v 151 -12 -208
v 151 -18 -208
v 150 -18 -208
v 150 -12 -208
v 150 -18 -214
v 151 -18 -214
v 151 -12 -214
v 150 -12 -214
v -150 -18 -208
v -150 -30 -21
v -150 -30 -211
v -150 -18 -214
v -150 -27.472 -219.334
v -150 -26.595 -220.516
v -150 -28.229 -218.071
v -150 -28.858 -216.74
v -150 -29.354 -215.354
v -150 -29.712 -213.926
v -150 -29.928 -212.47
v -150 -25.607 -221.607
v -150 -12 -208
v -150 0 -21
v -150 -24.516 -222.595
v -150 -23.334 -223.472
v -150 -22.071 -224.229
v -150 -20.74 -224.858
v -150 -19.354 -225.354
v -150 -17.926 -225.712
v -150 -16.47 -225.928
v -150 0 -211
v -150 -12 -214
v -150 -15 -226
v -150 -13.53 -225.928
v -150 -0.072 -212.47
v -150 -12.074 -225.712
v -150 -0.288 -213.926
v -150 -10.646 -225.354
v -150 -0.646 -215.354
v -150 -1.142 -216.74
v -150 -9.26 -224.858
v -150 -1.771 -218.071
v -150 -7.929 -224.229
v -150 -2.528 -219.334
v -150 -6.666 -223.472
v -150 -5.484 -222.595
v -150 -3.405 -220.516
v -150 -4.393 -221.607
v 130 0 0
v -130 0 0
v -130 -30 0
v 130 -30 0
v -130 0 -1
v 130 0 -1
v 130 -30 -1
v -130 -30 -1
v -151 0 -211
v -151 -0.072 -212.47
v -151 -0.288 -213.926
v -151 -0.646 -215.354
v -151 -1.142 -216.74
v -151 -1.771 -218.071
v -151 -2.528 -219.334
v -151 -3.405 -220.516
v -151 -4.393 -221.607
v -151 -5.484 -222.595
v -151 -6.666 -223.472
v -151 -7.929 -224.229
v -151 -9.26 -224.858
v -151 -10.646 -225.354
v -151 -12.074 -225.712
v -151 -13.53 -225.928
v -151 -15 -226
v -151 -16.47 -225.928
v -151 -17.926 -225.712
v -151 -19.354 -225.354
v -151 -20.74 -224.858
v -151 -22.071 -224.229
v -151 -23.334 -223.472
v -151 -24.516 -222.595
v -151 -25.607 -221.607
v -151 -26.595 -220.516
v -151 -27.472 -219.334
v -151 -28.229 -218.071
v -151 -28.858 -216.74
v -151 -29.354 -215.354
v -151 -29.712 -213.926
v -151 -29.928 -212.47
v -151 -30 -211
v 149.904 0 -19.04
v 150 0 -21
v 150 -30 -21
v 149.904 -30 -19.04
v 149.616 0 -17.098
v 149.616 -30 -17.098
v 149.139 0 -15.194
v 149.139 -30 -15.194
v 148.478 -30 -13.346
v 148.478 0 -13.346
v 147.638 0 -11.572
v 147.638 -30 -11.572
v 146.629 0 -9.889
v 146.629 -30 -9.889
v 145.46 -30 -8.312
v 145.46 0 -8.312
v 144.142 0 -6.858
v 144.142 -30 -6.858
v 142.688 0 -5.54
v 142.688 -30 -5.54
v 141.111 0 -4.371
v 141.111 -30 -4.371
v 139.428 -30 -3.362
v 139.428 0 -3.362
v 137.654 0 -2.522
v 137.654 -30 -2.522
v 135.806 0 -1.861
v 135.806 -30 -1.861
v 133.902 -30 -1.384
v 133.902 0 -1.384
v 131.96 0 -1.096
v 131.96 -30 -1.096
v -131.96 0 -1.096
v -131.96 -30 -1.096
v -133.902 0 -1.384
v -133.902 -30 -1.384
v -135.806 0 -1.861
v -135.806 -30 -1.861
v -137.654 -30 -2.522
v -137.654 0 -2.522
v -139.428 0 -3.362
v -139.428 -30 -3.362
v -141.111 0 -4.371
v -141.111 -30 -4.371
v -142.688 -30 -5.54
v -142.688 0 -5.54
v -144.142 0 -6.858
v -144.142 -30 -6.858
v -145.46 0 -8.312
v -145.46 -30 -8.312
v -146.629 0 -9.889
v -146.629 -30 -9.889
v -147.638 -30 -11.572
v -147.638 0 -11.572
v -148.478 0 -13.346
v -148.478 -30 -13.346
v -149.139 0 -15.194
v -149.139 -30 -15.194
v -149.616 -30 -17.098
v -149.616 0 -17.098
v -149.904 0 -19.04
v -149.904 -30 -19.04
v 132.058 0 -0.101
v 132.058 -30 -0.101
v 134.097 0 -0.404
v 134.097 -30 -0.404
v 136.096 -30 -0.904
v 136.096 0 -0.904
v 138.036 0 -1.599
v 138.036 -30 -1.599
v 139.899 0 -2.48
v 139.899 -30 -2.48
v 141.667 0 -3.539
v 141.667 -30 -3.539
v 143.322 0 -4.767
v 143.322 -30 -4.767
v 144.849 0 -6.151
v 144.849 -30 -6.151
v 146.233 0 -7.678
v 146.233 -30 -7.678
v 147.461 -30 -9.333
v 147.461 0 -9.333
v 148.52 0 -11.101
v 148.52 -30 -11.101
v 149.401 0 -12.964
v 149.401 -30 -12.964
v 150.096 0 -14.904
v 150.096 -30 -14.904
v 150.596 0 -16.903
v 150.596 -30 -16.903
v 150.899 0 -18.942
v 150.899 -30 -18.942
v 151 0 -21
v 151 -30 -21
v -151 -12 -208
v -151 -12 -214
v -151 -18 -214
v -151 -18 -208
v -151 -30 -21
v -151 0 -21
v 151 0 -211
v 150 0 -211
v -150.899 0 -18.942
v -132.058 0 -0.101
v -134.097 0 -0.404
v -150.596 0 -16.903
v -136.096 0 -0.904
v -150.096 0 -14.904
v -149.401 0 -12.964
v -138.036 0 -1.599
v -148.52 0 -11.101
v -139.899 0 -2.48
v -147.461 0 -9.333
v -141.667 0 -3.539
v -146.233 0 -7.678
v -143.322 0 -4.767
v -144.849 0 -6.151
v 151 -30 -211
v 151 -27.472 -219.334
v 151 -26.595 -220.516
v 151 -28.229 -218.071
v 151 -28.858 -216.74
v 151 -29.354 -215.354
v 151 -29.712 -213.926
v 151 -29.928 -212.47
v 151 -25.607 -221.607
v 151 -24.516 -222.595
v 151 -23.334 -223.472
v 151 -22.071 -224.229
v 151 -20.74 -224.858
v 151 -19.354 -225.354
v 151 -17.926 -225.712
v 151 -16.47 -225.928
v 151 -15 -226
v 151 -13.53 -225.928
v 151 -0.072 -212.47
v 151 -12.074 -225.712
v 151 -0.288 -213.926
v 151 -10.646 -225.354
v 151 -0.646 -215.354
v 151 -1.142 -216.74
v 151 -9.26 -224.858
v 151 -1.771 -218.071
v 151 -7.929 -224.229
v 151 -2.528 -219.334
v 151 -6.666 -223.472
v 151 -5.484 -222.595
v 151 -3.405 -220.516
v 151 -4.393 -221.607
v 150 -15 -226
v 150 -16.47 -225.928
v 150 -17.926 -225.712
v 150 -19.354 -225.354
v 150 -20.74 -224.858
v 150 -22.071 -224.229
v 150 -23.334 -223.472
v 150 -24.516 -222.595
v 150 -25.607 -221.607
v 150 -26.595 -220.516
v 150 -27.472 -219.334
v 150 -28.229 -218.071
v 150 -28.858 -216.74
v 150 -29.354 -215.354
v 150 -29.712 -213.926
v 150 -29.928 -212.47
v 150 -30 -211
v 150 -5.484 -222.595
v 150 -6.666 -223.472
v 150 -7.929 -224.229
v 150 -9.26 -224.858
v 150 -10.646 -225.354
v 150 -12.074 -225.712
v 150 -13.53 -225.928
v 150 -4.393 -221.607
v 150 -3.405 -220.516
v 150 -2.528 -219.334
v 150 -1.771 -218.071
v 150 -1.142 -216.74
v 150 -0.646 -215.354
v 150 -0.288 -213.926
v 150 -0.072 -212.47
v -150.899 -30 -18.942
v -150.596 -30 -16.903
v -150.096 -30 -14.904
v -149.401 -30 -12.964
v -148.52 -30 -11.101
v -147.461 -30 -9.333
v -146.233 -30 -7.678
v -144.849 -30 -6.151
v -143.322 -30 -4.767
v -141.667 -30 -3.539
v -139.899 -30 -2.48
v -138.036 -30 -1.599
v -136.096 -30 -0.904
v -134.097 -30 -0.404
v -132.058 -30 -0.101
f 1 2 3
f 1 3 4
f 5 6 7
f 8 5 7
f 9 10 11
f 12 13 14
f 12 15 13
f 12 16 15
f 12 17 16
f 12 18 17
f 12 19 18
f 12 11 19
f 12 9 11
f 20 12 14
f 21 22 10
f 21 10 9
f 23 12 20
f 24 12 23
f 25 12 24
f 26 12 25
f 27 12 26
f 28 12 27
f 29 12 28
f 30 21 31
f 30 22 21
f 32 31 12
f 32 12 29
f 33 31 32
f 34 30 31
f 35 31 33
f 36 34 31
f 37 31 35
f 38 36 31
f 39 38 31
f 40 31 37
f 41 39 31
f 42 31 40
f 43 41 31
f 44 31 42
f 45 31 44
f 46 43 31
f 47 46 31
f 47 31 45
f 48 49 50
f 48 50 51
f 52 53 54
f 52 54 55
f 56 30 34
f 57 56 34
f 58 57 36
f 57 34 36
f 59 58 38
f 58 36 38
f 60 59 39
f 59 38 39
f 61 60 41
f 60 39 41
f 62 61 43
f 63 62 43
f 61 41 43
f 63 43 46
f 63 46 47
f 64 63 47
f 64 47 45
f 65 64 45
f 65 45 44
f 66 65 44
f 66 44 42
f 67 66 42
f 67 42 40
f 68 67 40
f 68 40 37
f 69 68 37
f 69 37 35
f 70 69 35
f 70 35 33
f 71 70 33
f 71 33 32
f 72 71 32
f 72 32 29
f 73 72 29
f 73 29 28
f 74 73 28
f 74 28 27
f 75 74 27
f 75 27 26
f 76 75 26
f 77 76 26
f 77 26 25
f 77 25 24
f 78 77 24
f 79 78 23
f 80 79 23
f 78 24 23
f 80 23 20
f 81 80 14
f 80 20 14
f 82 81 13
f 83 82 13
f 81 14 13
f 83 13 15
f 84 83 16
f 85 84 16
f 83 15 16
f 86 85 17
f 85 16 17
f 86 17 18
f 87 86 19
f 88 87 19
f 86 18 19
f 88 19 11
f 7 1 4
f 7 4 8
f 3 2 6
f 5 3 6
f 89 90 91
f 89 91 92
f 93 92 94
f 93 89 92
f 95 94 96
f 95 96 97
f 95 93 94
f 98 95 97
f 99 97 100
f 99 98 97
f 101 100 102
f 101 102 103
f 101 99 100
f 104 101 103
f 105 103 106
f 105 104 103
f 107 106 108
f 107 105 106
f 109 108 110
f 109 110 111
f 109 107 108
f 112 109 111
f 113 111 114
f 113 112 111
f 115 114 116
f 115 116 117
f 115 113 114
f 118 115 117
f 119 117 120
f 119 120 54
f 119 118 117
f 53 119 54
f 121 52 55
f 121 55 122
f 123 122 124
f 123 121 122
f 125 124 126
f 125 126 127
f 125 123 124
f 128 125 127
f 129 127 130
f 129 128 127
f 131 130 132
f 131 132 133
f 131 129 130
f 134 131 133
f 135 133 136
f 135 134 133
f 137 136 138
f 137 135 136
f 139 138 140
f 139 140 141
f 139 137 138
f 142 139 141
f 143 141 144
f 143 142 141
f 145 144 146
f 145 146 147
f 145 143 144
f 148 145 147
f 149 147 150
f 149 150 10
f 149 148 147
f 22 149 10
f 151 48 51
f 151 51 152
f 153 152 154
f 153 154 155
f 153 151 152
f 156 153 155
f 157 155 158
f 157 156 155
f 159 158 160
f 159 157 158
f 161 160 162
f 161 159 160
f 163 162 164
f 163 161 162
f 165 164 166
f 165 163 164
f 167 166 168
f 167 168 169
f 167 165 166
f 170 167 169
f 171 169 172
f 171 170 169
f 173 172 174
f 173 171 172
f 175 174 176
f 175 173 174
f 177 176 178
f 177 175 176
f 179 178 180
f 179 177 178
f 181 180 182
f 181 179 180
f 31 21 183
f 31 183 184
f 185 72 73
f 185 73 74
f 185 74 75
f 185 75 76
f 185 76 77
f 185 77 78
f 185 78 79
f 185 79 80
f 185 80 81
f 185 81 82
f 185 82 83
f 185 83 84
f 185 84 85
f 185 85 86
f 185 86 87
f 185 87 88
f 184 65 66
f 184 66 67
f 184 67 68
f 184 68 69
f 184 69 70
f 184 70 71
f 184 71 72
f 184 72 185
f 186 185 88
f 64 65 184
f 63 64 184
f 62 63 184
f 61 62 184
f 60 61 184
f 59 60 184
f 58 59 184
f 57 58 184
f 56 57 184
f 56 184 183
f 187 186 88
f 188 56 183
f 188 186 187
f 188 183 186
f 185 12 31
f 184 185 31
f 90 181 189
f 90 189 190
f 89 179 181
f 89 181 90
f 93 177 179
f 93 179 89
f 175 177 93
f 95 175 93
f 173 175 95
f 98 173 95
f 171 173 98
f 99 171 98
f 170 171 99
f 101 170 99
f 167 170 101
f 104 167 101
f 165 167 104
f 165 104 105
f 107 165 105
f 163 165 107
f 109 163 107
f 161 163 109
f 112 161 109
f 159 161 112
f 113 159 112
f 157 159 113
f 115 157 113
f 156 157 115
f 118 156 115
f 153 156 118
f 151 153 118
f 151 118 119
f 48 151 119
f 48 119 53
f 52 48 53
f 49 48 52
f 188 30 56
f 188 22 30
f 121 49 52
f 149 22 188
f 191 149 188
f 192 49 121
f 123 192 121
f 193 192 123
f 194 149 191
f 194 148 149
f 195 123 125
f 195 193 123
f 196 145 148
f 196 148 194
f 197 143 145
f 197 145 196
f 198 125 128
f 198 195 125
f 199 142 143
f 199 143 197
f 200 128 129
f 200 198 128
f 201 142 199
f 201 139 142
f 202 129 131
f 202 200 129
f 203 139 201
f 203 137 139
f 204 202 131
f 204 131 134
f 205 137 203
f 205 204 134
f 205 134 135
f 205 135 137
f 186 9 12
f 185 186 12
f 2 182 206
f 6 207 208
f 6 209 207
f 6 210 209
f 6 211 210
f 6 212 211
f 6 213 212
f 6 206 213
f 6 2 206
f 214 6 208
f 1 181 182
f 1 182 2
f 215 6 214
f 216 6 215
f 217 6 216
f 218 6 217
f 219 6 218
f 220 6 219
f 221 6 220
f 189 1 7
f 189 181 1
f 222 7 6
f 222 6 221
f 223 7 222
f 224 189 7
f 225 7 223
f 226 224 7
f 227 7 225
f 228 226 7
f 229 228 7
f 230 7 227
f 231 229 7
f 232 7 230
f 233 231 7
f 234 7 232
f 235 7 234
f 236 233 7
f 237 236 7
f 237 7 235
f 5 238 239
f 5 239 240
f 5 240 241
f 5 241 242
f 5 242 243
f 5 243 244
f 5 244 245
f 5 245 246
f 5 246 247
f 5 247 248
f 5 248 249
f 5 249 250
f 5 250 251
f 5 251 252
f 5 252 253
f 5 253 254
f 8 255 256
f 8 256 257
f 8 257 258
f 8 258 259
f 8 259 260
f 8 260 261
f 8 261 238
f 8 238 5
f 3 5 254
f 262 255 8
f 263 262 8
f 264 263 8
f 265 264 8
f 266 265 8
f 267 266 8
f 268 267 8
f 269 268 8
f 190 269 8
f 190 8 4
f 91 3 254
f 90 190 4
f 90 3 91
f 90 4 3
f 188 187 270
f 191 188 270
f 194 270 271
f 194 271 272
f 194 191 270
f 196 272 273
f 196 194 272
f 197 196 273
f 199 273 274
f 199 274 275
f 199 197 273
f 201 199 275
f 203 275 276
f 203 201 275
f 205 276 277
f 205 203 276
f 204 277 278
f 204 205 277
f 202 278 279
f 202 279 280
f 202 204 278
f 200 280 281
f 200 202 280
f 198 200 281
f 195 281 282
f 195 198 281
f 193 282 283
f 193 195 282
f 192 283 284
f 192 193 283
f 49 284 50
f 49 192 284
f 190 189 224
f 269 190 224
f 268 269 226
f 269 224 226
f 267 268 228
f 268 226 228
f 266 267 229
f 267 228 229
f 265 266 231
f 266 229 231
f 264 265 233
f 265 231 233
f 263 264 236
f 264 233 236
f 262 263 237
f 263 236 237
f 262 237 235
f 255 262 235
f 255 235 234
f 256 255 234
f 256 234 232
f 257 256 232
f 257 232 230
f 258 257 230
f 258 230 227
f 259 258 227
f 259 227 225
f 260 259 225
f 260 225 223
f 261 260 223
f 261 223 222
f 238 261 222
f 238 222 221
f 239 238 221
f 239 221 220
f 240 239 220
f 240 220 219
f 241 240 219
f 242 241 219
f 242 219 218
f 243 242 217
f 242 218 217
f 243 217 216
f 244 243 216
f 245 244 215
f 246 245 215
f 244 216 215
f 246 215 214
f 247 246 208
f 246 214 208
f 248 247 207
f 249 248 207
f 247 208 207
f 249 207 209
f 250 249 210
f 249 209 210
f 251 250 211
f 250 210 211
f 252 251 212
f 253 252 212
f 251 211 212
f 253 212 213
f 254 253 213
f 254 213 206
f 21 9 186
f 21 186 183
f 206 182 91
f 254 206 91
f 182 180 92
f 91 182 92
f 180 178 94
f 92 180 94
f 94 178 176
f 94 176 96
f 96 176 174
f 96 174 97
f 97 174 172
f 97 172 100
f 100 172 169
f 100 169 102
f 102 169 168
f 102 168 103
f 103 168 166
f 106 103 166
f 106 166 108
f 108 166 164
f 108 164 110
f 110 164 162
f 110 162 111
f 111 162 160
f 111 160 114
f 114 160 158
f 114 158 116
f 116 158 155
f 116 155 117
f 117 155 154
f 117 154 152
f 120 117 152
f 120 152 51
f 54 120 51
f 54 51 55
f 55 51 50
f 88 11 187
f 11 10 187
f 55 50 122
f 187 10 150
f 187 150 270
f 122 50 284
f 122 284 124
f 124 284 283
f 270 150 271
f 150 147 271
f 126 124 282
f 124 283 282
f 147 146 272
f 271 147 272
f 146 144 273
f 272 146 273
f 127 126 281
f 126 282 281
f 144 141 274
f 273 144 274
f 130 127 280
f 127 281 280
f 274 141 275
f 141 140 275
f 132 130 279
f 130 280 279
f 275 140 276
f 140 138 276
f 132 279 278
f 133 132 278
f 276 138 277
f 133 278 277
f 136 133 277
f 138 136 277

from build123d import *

# Parameters (mm, degrees)
LINEAR_AUSTRAGEN_D_NN1_DEPTH    = 30
SCHNITT_LINEAR_AUSTRAGEN1_DEPTH = 303
SKIZZE5_W                       = 6
SKIZZE5_H                       = 6
SCHNITT_LINEAR_AUSTRAGEN2_DEPTH = 303


with BuildPart() as part:
    # Skizze3 → Linear-Austragen-Dünn1 (new body)
    with BuildSketch(Plane.XZ):
        with BuildLine():
            Line((-151, -226), (-151, -151))
            Line((-151, -151), (-151, -21))
            ThreePointArc((-151, -21), (-144.849242405, -6.150757595), (-130, 0))
            Line((-130, 0), (130, 0))
            ThreePointArc((130, 0), (144.849242405, -6.150757595), (151, -21))
            Line((151, -21), (151, -151))
            Line((151, -151), (151, -226))
            Line((151, -226), (150, -226))
            Line((150, -226), (150, -151))
            Line((150, -151), (150, -21))
            ThreePointArc((150, -21), (144.142135624, -6.857864376), (130, -1))
            Line((130, -1), (-130, -1))
            ThreePointArc((-130, -1), (-144.142135624, -6.857864376), (-150, -21))
            Line((-150, -21), (-150, -151))
            Line((-150, -151), (-150, -226))
            Line((-150, -226), (-151, -226))
        make_face()
    extrude(amount=LINEAR_AUSTRAGEN_D_NN1_DEPTH)

    # Skizze4 → Schnitt-Linear austragen1 (cut, through all)
    with BuildSketch(Plane(origin=(151, 0, 0), x_dir=(0, 0, -1), z_dir=(1, 0, 0))):
        with BuildLine():
            Line((236.953367606, 0), (211, 0))
            ThreePointArc((211, 0), (226, -15), (211, -30))
            Line((211, -30), (236.953367606, -30))
            Line((236.953367606, -30), (236.953367606, 0))
        make_face()
    extrude(amount=-SCHNITT_LINEAR_AUSTRAGEN1_DEPTH, mode=Mode.SUBTRACT)

    # Skizze5 → Schnitt-Linear austragen2 (cut, through all)
    with BuildSketch(Plane(origin=(151, 0, 0), x_dir=(0, 0, -1), z_dir=(1, 0, 0))):
        with Locations((211, -15)):
            Rectangle(SKIZZE5_W, SKIZZE5_H)
    extrude(amount=-SCHNITT_LINEAR_AUSTRAGEN2_DEPTH, mode=Mode.SUBTRACT)


solid = part.part
